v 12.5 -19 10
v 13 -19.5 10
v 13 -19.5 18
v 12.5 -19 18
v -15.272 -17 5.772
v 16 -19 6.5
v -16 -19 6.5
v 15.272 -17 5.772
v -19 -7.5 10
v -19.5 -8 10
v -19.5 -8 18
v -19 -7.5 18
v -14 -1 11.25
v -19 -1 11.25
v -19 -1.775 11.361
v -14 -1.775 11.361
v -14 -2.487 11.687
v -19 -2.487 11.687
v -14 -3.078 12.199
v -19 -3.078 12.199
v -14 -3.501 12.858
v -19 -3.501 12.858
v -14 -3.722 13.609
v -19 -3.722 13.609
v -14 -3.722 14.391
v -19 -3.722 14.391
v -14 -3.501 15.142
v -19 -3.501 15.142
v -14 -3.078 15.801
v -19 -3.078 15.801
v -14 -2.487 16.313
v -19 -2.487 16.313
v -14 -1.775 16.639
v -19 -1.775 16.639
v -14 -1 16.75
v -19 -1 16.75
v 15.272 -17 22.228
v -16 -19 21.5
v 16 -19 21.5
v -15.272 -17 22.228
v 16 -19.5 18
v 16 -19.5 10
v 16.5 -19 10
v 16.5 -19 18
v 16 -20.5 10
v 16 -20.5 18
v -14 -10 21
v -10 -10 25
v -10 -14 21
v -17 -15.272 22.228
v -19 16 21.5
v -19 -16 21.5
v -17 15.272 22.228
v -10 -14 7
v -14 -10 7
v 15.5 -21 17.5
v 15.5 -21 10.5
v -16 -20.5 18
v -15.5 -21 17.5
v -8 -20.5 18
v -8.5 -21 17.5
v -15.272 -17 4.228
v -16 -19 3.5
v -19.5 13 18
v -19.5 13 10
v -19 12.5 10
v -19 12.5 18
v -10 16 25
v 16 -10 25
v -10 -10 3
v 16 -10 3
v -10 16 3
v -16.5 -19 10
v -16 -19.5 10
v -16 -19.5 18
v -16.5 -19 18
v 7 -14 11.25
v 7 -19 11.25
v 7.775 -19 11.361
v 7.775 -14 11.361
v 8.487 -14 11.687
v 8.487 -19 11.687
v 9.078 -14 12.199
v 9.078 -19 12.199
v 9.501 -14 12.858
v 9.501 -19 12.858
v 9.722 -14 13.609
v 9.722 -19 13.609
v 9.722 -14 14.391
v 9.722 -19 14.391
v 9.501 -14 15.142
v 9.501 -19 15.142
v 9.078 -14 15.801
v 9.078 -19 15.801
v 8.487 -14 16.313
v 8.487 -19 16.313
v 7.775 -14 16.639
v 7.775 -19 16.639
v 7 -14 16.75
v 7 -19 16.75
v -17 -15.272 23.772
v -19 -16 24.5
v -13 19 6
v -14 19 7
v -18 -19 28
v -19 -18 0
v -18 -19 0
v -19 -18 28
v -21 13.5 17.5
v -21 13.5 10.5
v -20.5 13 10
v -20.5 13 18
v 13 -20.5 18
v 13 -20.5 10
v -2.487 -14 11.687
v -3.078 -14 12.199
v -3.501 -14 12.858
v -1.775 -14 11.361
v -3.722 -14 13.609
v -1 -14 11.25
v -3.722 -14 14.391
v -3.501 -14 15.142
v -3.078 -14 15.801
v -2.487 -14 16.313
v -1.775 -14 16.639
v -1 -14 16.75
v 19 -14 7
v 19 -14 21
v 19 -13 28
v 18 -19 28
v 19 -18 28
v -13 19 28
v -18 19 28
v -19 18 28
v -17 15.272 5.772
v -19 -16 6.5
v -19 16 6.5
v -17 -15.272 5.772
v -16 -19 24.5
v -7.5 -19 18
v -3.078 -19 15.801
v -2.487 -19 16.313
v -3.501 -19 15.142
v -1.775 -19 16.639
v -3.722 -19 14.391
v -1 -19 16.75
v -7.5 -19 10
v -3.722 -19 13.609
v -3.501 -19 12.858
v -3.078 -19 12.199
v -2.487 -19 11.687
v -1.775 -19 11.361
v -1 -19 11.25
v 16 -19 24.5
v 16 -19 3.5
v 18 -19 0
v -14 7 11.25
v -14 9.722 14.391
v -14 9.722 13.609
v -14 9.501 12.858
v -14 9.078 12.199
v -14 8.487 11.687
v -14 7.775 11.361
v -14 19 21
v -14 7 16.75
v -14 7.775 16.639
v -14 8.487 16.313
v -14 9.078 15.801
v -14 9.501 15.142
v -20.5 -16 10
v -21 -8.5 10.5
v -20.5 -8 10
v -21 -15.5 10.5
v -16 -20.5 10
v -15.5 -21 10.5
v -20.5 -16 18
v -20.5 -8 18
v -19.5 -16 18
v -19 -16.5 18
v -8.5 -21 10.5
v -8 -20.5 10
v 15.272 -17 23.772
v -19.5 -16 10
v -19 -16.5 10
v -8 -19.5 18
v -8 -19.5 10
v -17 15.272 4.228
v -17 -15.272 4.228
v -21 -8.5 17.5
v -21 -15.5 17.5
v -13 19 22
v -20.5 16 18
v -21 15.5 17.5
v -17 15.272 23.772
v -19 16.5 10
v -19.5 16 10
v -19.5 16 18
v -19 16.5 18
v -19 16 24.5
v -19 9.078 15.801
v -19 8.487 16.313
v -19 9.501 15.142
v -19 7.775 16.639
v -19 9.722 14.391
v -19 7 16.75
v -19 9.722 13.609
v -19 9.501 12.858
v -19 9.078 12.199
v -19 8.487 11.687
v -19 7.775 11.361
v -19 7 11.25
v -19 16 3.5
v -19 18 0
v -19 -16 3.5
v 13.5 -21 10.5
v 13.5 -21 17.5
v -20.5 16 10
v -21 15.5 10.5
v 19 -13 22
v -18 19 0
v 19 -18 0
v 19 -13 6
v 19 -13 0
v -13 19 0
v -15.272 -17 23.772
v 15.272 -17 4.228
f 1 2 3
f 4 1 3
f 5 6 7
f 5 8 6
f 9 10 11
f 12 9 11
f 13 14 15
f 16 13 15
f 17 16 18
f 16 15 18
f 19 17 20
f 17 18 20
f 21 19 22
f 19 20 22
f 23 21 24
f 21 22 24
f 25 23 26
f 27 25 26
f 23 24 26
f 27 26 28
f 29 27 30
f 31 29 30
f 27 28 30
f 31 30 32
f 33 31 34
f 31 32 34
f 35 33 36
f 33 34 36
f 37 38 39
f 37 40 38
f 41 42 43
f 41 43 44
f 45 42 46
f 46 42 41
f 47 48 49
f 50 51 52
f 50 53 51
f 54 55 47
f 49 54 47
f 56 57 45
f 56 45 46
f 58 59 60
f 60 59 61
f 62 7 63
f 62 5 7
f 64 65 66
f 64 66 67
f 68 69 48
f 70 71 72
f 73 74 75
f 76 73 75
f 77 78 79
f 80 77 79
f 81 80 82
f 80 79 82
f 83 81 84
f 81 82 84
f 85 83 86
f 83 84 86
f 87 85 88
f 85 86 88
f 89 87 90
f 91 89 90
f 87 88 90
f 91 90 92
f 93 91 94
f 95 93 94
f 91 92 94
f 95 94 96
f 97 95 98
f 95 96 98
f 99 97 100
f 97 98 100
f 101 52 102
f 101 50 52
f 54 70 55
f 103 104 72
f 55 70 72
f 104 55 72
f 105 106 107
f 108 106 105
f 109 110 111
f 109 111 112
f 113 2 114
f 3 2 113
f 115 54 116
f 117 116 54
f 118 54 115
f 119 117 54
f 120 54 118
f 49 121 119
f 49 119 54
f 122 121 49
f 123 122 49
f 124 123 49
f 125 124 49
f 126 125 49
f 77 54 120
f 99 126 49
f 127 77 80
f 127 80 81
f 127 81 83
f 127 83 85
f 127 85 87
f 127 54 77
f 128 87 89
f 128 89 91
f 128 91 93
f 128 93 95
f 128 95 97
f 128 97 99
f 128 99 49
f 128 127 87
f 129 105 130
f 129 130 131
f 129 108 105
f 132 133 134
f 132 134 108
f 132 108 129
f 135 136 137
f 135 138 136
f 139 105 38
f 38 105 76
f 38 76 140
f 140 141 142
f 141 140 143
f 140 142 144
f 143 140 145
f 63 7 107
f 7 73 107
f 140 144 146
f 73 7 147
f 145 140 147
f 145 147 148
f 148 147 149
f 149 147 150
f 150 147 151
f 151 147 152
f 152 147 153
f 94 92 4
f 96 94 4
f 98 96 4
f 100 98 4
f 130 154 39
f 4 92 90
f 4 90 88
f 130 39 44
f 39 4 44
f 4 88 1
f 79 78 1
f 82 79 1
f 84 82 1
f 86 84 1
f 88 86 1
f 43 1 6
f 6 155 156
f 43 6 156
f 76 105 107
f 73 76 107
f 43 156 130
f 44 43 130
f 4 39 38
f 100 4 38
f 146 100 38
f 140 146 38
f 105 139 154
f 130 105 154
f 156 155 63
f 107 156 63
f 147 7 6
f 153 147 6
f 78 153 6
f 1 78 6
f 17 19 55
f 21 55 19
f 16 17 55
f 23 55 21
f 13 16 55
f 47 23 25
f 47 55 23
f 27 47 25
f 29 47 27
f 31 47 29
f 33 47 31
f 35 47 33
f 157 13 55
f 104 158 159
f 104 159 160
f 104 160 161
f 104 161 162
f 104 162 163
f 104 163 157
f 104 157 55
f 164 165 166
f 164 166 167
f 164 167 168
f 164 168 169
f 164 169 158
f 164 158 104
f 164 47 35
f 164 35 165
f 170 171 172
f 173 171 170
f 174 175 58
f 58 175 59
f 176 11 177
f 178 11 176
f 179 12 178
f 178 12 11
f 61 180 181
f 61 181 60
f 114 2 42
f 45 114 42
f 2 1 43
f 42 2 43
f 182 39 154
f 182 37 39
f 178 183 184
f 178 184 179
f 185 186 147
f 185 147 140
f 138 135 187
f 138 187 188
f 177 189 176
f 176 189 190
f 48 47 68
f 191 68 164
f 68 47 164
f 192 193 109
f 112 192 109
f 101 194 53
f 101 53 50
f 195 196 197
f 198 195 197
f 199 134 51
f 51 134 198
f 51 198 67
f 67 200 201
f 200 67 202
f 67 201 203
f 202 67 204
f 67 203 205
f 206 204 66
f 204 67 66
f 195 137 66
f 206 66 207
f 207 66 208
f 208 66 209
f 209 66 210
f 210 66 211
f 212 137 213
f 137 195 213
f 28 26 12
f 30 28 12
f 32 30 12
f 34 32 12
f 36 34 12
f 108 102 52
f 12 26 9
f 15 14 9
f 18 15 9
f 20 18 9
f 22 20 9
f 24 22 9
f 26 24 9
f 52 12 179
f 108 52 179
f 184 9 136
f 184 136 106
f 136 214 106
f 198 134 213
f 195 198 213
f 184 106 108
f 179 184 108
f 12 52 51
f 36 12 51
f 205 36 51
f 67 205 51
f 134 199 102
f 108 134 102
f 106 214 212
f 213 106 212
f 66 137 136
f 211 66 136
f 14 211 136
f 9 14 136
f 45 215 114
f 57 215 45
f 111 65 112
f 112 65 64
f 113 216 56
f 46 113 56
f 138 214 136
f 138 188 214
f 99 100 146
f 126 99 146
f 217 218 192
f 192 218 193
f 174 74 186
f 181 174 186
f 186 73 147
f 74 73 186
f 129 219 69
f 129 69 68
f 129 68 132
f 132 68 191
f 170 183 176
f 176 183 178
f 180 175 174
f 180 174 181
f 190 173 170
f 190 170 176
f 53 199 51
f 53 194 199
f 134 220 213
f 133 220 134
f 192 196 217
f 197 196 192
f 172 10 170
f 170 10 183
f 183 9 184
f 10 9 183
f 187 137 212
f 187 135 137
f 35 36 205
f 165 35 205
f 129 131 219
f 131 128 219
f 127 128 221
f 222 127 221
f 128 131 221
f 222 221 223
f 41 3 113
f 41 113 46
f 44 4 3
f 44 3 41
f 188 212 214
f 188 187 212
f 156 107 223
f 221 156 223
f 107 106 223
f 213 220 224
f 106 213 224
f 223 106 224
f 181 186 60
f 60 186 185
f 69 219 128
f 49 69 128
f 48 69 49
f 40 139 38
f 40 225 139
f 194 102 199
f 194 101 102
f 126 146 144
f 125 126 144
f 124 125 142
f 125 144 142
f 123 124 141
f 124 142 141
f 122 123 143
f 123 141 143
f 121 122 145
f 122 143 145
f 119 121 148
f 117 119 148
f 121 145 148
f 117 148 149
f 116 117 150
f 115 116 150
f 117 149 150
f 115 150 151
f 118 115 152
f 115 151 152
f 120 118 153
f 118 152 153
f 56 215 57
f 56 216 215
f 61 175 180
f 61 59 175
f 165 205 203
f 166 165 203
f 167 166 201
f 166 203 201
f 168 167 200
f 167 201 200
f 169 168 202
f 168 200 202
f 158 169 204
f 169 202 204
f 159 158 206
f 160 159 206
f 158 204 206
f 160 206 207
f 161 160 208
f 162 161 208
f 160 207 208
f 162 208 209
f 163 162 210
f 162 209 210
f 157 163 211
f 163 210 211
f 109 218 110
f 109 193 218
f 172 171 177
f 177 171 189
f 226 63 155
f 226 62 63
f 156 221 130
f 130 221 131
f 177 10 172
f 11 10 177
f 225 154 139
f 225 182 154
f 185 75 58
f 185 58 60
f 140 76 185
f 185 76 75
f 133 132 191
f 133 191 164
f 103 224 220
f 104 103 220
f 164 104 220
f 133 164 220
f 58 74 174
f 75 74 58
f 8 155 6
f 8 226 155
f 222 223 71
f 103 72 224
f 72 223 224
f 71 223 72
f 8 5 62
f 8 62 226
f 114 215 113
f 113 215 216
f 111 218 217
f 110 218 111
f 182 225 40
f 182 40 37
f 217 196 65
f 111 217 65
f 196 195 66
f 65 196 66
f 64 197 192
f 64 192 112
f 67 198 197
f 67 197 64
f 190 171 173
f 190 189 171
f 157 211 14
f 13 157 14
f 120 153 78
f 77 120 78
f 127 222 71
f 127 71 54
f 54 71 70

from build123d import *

# Parameters (mm, degrees)
F1_DEPTH  = 28
F2_W      = 33
F2_H      = 22
F3_DEPTH  = 33
F6_DEPTH  = 25
F7_DEPTH  = 25
F4_W      = 8
F4_H      = 8
F4_W_2    = 3
F8_DEPTH  = 2
F5_W      = 32
F5_H      = 3
F9_DEPTH  = 2
F9_TAPER  = 20
F5_W_2    = 3
F5_H_2    = 8
F5_W_3    = 8
F10_DEPTH = 2
F4_W_3    = 32
F4_H_2    = 3
F11_DEPTH = 2
F11_TAPER = 20
F12_SIZE  = 1
F13_SIZE  = 0.5
F14_SIZE  = 4


with BuildPart() as f1:
    # F0 (on Top) → F1 (new body)
    with BuildSketch(Plane.XY):
        Polygon((-19, -19), (19, -19), (19, -13), (-13, 19), (-19, 19), align=None)
    extrude(amount=F1_DEPTH)

    # F2 (on face) → F3 (cut, through all)
    with BuildSketch(Plane.YZ.offset(19)):
        with Locations((2.5, 14)):
            Rectangle(F2_W, F2_H)
    extrude(amount=-F3_DEPTH, mode=Mode.SUBTRACT)

    # F4 (on face) → F6 (cut)
    with BuildSketch(Plane.XZ.offset(19)):
        with BuildLine():
            Line((-1, 11.25), (7, 11.25))
            ThreePointArc((7, 11.25), (9.75, 14), (7, 16.75))
            Line((7, 16.75), (-1, 16.75))
            ThreePointArc((-1, 16.75), (-3.75, 14), (-1, 11.25))
        make_face()
    extrude(amount=-F6_DEPTH, mode=Mode.SUBTRACT)

    # F5 (on face) → F7 (cut)
    with BuildSketch(Plane(origin=(-19, 0, 0), x_dir=(0, -1, 0), z_dir=(-1, 0, 0))):
        with BuildLine():
            Line((-7, 11.25), (1, 11.25))
            ThreePointArc((1, 11.25), (3.75, 14), (1, 16.75))
            Line((1, 16.75), (-7, 16.75))
            ThreePointArc((-7, 16.75), (-9.75, 14), (-7, 11.25))
        make_face()
    extrude(amount=-F7_DEPTH, mode=Mode.SUBTRACT)

    # F4 (on face) → F8 (join)
    with BuildSketch(Plane.XZ.offset(19)):
        with Locations((-12, 14)):
            Rectangle(F4_W, F4_H)
        with Locations((14.5, 14)):
            Rectangle(F4_W_2, F4_H)
    extrude(amount=F8_DEPTH)

    # F5 (on face) → F9 (cut)
    with BuildSketch(Plane(origin=(-19, 0, 0), x_dir=(0, -1, 0), z_dir=(-1, 0, 0))):
        with Locations((0, 23)):
            Rectangle(F5_W, F5_H)
        with Locations((0, 5)):
            Rectangle(F5_W, F5_H)
    extrude(amount=-F9_DEPTH, taper=F9_TAPER, mode=Mode.SUBTRACT)

    # F5 (on face) → F10 (join)
    with BuildSketch(Plane(origin=(-19, 0, 0), x_dir=(0, -1, 0), z_dir=(-1, 0, 0))):
        with Locations((-14.5, 14)):
            Rectangle(F5_W_2, F5_H_2)
        with Locations((12, 14)):
            Rectangle(F5_W_3, F5_H_2)
    extrude(amount=F10_DEPTH)

    # F4 (on face) → F11 (cut)
    with BuildSketch(Plane.XZ.offset(19)):
        with Locations((0, 23)):
            Rectangle(F4_W_3, F4_H_2)
        with Locations((0, 5)):
            Rectangle(F4_W_3, F4_H_2)
    extrude(amount=-F11_DEPTH, taper=F11_TAPER, mode=Mode.SUBTRACT)

    # F12
    f12_edges = [f1.edges().sort_by_distance(p)[0] for p in [
        (-19, -19, 14),
        (19, -19, 14),
        (-19, 19, 14),
    ]]
    chamfer(f12_edges, length=F12_SIZE)

    # F13
    f13_edges = [f1.edges().sort_by_distance(p)[0] for p in [
        (-21, 14.5, 10),
        (-21, 13, 14),
        (-21, 14.5, 18),
        (-21, 16, 14),
        (-21, -12, 10),
        (-21, -16, 14),
        (-21, -12, 18),
        (-21, -8, 14),
        (-12, -21, 10),
        (-8, -21, 14),
        (-12, -21, 18),
        (-16, -21, 14),
        (14.5, -21, 10),
        (16, -21, 14),
        (14.5, -21, 18),
        (13, -21, 14),
        (-19, 13, 14),
        (-19, -16, 14),
        (-16, -19, 14),
        (13, -19, 14),
        (-19, -8, 14),
        (-19, 16, 14),
        (16, -19, 14),
        (-8, -19, 14),
    ]]
    chamfer(f13_edges, length=F13_SIZE)

    # F14
    f14_edges = [f1.edges().sort_by_distance(p)[0] for p in [
        (-14, 2.5, 3),
        (2.5, -14, 3),
        (-14, 2.5, 25),
        (2.5, -14, 25),
        (-14, -14, 14),
    ]]
    chamfer(f14_edges, length=F14_SIZE)


solid = f1.part
